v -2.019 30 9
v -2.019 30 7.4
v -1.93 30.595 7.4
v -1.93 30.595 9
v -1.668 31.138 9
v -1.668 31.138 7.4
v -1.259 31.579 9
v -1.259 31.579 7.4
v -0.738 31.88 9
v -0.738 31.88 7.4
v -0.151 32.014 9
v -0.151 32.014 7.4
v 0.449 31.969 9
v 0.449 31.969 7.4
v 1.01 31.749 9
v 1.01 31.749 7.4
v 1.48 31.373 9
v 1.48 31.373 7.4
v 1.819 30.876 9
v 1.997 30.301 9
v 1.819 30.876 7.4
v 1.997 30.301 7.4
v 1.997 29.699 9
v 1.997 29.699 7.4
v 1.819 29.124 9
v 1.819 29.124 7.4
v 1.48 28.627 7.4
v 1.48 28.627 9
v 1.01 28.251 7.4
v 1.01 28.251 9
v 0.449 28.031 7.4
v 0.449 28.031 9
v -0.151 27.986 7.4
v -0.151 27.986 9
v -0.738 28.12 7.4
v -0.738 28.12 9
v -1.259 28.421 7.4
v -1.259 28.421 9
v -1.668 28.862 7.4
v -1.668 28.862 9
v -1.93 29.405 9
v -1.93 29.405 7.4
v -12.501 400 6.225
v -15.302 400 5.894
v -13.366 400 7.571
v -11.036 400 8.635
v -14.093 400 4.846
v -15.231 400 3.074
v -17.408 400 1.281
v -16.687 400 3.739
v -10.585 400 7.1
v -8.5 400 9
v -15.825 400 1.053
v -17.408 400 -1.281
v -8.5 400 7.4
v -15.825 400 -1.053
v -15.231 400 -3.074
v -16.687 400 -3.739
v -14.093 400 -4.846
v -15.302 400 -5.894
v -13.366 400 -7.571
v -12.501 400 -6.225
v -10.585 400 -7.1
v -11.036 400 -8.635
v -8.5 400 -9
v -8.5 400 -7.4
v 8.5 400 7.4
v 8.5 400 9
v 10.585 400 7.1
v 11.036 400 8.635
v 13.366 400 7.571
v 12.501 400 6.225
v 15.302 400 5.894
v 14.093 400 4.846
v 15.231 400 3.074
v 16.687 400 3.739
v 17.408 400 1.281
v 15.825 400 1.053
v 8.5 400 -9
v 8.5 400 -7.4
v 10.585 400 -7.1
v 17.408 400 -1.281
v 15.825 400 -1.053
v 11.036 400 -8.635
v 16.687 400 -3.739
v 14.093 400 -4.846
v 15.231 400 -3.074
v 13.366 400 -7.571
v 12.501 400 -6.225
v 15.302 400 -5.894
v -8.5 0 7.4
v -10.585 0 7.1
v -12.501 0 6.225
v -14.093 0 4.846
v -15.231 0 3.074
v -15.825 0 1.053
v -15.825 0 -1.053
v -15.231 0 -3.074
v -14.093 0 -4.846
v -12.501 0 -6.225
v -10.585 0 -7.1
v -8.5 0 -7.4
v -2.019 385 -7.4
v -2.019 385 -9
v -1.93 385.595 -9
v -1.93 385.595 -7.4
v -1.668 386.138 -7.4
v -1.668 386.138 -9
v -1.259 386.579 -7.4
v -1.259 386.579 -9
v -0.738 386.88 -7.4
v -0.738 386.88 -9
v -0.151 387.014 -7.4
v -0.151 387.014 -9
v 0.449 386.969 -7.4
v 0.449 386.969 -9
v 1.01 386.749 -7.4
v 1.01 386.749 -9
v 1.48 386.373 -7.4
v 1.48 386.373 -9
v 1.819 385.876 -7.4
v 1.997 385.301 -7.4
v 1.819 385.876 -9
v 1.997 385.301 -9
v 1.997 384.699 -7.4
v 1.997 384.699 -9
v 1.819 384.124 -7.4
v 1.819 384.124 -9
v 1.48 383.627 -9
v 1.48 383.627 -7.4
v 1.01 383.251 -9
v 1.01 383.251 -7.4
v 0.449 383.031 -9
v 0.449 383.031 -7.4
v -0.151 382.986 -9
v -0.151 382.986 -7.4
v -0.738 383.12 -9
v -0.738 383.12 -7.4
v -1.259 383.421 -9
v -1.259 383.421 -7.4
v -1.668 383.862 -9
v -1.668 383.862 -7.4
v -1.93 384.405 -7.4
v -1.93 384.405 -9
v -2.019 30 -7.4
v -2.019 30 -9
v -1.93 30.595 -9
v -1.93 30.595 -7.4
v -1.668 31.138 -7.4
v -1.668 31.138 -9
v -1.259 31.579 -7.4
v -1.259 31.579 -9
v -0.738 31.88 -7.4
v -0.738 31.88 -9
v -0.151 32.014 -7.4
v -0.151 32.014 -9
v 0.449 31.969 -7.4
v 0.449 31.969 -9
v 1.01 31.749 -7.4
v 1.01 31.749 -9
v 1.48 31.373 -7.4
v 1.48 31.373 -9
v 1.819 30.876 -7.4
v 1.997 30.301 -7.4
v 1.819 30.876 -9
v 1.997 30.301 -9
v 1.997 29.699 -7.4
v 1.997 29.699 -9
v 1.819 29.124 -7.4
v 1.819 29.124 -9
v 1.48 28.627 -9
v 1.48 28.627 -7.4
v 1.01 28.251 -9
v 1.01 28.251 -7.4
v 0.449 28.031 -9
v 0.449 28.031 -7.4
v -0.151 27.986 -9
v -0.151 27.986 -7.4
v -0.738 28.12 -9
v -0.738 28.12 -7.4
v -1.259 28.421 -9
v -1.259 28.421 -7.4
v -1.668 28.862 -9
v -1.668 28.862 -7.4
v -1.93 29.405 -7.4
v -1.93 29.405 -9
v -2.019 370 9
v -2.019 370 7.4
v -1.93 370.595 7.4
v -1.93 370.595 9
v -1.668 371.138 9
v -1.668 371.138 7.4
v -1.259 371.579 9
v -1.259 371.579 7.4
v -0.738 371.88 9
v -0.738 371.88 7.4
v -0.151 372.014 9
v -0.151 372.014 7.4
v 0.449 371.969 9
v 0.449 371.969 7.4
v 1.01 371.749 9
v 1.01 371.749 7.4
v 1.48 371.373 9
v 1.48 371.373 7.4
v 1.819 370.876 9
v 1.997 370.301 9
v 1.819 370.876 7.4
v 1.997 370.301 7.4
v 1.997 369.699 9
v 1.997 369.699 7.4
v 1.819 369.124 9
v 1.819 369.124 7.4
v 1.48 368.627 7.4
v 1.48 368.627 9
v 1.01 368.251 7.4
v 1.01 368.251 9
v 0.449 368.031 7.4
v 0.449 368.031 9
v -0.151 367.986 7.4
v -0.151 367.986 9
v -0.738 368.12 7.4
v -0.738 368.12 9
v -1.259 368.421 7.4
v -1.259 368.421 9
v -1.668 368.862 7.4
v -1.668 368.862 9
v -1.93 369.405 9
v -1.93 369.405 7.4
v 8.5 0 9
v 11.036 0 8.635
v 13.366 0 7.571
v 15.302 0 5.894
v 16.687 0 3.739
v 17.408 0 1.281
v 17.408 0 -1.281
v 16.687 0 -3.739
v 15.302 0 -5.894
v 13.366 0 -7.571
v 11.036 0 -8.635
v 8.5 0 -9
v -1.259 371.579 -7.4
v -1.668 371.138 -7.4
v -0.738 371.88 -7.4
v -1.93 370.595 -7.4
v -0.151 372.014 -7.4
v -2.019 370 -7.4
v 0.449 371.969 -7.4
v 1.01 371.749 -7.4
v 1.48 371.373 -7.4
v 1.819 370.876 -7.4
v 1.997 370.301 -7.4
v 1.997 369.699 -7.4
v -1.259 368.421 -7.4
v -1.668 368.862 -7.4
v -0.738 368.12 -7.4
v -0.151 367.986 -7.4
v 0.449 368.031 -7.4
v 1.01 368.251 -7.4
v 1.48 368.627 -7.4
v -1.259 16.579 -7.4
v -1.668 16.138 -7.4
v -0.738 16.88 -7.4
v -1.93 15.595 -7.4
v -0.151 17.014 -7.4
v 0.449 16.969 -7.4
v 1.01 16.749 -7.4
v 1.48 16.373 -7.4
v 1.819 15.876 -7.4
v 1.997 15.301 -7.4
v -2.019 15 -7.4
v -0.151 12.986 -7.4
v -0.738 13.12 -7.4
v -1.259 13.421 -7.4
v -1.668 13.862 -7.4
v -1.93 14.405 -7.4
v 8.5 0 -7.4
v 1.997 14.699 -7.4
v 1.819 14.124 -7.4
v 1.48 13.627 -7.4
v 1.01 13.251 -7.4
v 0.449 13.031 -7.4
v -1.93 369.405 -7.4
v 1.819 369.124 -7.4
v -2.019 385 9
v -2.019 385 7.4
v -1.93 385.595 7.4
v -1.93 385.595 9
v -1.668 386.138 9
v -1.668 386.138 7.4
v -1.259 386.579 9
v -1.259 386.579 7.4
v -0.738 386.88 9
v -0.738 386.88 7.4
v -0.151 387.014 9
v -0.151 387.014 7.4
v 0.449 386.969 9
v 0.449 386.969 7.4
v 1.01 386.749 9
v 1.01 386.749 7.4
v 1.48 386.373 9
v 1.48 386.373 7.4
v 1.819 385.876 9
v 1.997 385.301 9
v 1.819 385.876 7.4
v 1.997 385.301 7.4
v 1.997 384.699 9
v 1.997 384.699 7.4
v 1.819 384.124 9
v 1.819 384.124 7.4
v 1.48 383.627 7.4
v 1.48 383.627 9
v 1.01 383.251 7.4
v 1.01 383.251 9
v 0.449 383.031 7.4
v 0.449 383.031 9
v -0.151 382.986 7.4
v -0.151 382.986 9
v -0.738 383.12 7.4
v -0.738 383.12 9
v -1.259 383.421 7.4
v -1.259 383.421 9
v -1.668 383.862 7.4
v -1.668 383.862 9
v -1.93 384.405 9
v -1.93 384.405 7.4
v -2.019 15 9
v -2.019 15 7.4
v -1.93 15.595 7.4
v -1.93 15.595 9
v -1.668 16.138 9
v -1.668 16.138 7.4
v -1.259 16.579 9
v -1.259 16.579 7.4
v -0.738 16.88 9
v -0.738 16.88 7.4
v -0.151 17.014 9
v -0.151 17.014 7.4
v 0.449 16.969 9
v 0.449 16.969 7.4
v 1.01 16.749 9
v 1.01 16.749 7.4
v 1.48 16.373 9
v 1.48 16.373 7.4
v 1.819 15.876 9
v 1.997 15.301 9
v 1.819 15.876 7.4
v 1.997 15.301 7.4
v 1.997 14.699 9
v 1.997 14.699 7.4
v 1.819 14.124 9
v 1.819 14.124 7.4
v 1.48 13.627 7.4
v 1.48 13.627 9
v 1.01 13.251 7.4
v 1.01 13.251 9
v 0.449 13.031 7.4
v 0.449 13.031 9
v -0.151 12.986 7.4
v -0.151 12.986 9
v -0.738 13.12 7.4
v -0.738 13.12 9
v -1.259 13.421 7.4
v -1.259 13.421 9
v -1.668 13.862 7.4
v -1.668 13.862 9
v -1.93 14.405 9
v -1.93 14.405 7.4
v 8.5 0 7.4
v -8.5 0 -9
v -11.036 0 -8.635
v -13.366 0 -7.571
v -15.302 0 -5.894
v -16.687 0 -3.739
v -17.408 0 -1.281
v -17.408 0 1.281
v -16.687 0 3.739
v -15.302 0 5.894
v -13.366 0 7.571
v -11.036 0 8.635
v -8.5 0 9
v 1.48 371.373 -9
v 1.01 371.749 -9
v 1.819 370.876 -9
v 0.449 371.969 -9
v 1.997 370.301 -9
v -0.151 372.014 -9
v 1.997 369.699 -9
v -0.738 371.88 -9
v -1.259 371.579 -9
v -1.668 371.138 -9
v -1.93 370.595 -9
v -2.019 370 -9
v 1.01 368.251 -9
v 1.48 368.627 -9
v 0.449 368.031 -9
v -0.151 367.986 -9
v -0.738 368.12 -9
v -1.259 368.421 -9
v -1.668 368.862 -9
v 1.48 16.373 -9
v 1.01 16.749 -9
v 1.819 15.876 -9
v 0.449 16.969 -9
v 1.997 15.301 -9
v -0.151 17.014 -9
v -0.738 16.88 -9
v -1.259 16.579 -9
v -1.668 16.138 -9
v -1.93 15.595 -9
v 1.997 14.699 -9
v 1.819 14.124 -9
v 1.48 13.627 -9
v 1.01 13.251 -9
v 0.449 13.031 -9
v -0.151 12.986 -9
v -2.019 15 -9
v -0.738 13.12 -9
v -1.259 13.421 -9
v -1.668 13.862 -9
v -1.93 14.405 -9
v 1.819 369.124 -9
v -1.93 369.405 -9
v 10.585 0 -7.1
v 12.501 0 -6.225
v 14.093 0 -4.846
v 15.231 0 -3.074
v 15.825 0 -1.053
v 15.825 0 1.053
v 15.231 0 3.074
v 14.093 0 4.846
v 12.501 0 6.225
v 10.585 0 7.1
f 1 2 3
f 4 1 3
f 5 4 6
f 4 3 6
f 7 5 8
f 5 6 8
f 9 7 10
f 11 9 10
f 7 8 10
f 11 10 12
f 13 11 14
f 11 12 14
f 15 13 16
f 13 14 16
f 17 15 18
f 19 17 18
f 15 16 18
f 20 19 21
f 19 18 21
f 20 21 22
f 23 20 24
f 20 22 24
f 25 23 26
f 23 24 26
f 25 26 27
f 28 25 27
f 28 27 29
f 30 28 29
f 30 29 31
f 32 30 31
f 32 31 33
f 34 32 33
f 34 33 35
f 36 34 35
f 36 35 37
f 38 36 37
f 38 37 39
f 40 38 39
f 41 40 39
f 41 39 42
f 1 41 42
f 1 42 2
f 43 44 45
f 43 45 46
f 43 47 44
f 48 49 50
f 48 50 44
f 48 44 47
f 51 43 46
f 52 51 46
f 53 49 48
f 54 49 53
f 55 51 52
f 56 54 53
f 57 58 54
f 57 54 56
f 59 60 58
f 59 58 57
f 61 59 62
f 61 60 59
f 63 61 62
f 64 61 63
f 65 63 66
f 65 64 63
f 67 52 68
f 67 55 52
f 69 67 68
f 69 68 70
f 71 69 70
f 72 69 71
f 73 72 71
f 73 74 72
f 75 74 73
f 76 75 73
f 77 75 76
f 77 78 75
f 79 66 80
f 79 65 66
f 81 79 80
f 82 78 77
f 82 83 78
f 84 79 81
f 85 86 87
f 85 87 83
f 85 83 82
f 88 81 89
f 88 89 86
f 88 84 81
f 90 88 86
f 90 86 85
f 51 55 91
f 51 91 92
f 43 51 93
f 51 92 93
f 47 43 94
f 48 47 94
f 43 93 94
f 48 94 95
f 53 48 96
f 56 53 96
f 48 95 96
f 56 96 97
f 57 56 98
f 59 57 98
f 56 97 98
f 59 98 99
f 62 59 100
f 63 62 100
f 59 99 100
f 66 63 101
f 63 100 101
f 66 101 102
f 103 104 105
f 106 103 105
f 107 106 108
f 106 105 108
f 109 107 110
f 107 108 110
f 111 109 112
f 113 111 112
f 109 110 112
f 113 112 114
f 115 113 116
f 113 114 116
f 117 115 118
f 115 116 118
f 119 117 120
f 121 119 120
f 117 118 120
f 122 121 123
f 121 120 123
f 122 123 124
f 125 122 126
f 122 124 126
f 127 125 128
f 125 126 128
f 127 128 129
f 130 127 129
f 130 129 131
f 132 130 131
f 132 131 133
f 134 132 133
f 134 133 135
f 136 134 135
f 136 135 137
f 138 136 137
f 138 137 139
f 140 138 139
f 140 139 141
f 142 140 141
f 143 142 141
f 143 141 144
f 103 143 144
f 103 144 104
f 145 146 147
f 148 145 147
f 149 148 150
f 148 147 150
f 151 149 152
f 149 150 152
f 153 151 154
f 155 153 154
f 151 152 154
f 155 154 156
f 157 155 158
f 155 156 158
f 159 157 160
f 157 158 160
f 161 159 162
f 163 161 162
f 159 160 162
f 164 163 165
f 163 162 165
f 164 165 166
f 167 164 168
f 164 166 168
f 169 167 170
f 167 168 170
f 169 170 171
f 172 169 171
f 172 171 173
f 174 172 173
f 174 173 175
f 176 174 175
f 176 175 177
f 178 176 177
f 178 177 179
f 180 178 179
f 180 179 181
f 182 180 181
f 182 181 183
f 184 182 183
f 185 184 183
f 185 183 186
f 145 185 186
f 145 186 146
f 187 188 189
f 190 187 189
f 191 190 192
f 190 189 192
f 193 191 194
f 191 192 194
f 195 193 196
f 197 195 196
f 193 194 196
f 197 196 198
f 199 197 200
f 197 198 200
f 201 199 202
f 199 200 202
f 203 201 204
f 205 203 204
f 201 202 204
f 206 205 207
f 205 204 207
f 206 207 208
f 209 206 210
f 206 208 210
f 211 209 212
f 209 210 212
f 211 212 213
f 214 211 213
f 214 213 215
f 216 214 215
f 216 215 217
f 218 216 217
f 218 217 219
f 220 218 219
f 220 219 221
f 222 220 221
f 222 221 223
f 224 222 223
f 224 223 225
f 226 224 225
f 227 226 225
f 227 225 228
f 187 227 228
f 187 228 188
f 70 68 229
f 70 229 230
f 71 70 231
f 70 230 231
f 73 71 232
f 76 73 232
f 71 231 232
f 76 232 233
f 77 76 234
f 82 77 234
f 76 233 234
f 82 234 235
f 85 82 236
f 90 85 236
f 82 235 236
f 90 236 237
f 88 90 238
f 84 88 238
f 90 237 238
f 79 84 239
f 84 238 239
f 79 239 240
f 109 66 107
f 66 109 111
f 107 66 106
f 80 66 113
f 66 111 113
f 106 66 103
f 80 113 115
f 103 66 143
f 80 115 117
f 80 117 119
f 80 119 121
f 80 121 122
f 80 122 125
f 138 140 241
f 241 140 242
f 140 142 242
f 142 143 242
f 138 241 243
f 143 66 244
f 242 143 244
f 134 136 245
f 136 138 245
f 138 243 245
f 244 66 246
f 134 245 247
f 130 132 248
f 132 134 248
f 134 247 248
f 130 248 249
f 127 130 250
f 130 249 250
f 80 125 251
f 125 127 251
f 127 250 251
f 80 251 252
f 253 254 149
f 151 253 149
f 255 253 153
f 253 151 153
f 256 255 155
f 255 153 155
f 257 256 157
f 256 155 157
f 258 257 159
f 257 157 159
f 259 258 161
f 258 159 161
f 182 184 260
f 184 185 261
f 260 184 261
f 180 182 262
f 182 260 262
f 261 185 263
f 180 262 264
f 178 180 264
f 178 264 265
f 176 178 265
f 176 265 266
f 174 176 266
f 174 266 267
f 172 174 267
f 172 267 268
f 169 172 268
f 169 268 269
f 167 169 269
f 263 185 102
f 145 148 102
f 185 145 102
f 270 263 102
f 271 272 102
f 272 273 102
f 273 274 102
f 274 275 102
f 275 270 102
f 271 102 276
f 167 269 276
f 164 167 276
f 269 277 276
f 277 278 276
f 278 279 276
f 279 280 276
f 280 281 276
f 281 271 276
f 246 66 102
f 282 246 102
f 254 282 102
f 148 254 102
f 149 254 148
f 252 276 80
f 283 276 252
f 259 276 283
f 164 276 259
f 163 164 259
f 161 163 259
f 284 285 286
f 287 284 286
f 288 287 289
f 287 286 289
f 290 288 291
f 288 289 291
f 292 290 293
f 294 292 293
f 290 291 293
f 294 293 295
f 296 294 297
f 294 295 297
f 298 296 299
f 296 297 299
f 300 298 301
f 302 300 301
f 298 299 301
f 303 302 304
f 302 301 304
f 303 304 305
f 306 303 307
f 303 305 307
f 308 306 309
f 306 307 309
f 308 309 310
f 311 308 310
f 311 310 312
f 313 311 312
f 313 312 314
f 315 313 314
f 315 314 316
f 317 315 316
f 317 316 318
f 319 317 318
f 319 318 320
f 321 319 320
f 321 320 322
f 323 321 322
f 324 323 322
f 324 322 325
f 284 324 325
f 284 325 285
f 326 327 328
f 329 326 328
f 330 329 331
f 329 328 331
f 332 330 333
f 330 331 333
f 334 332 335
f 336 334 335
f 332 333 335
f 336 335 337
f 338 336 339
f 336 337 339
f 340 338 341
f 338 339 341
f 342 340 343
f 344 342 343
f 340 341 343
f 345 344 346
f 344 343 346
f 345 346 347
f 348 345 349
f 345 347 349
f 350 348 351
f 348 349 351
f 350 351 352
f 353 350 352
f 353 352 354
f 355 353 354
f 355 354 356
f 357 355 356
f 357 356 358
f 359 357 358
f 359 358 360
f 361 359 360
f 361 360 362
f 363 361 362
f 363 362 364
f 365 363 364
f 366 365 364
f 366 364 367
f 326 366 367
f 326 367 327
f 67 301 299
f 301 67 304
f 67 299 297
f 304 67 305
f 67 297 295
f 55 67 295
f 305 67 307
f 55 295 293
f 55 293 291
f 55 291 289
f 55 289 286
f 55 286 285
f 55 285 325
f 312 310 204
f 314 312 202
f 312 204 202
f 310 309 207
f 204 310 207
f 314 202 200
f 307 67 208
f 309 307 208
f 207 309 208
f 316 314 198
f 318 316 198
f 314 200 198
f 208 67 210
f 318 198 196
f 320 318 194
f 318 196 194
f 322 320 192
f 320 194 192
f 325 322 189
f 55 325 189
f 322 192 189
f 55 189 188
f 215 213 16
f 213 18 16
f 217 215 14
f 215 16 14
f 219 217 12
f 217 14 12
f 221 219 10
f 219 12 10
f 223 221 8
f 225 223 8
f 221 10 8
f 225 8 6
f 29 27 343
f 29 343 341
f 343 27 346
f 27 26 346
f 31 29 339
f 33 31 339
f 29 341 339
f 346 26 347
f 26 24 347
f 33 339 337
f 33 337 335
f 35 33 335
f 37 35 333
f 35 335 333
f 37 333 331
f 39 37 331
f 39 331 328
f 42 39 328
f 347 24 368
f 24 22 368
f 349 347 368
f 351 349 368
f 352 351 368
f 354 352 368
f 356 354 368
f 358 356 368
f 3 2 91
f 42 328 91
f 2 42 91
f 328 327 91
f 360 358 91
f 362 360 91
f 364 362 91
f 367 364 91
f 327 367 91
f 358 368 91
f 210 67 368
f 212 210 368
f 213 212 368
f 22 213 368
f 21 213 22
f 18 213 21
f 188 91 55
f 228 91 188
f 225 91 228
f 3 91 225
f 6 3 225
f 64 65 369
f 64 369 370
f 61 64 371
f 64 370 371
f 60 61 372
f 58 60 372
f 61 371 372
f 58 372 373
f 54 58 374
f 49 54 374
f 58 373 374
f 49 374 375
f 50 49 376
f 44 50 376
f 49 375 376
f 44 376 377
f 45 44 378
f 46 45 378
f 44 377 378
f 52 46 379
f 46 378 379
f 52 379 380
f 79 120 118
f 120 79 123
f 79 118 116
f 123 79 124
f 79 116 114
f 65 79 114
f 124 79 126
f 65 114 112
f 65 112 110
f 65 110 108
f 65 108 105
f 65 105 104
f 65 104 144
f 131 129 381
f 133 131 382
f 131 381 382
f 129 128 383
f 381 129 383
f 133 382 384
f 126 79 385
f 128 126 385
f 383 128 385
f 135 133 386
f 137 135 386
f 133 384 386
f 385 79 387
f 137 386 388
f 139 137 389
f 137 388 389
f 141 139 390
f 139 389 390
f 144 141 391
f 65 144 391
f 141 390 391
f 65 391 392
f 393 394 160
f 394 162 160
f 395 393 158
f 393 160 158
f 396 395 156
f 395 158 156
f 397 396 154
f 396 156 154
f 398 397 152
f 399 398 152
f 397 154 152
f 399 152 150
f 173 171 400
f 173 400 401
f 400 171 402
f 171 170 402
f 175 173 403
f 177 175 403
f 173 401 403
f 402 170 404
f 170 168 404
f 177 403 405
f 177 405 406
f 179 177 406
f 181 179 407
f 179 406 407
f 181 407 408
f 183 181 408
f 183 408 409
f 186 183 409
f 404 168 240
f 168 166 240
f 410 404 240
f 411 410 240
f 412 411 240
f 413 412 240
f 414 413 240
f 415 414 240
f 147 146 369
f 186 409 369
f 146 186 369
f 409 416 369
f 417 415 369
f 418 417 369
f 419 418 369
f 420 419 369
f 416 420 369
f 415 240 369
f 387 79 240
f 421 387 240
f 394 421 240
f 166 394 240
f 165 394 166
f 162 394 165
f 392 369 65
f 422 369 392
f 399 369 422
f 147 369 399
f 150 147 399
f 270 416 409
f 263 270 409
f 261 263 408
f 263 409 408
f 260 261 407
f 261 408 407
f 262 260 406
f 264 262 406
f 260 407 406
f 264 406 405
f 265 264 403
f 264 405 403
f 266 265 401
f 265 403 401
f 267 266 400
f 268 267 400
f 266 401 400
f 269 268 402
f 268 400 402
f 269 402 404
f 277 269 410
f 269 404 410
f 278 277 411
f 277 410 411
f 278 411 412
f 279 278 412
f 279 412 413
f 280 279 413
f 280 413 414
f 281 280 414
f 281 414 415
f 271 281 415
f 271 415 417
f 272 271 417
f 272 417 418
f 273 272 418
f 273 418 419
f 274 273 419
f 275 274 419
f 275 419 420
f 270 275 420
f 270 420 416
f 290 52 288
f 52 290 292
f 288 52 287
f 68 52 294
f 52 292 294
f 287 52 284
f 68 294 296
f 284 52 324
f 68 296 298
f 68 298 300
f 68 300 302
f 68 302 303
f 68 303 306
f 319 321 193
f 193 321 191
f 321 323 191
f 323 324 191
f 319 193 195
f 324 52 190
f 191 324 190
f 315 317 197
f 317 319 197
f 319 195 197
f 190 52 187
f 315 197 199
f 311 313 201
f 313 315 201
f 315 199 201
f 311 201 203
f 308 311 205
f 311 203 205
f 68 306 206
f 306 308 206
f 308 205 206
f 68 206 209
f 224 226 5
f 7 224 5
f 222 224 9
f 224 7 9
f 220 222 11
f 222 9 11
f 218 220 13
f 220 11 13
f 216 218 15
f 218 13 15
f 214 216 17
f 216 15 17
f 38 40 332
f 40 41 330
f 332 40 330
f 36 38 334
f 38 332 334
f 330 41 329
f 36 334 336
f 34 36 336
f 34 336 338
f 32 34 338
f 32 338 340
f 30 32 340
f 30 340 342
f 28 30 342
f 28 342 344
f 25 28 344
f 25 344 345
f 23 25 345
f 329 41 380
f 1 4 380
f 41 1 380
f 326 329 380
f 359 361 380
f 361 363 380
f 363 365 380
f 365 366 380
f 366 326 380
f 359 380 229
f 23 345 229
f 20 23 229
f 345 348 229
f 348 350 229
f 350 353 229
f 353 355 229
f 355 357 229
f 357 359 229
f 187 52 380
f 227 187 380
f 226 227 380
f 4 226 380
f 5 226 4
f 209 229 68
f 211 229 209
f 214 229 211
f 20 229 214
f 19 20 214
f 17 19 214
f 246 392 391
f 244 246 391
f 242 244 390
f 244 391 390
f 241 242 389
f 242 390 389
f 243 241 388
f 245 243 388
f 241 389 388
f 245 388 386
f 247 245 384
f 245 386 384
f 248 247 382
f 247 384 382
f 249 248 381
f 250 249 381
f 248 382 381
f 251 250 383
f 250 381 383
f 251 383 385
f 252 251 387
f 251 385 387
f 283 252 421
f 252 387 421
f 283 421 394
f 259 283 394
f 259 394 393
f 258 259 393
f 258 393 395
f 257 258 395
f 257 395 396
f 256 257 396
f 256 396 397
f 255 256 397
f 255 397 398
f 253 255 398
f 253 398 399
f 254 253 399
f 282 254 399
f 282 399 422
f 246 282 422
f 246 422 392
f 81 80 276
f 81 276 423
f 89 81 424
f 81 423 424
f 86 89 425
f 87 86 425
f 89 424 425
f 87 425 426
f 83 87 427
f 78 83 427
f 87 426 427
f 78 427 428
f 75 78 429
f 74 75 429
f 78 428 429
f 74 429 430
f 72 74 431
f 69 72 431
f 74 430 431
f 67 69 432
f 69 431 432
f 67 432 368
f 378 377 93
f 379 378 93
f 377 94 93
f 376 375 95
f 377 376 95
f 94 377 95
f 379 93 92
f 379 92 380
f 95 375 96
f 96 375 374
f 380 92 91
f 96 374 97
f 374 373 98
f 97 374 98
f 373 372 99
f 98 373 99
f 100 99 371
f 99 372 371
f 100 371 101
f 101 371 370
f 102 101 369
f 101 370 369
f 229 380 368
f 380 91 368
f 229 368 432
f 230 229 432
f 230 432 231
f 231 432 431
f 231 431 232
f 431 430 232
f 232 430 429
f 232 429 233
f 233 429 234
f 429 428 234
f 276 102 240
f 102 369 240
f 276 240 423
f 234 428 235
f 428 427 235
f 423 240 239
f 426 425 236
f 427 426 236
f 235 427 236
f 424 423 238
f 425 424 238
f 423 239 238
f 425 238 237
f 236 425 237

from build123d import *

# Parameters (mm, degrees)
EXTRUDE_1_DEPTH       = 400
HOLE_WIZARD_10_32_1_D = 4.0386


with BuildPart() as part:
    # 草圖1 → 填料-伸長1 (new body)
    with BuildSketch(Plane(origin=(0, 0, 0), x_dir=(1, 0, 0), z_dir=(0, 1, 0))):
        with BuildLine():
            Line((8.5, 9), (-8.5, 9))
            ThreePointArc((-8.5, 9), (-17.5, 0), (-8.5, -9))
            Line((-8.5, -9), (8.5, -9))
            ThreePointArc((8.5, -9), (17.5, 0), (8.5, 9))
        make_face()
        with BuildLine():
            Line((8.5, -7.4), (-8.5, -7.4))
            ThreePointArc((-8.5, -7.4), (-15.9, 0), (-8.5, 7.4))
            Line((-8.5, 7.4), (8.5, 7.4))
            ThreePointArc((8.5, 7.4), (15.9, 0), (8.5, -7.4))
        make_face(mode=Mode.SUBTRACT)
    extrude(amount=EXTRUDE_1_DEPTH)

    # #10-32 螺紋孔1 (through all)
    with Locations(Plane.XY.offset(9)):
        with Locations((0, 30), (0, 15), (0, 385), (0, 370)):
            Hole(HOLE_WIZARD_10_32_1_D / 2)


solid = part.part
